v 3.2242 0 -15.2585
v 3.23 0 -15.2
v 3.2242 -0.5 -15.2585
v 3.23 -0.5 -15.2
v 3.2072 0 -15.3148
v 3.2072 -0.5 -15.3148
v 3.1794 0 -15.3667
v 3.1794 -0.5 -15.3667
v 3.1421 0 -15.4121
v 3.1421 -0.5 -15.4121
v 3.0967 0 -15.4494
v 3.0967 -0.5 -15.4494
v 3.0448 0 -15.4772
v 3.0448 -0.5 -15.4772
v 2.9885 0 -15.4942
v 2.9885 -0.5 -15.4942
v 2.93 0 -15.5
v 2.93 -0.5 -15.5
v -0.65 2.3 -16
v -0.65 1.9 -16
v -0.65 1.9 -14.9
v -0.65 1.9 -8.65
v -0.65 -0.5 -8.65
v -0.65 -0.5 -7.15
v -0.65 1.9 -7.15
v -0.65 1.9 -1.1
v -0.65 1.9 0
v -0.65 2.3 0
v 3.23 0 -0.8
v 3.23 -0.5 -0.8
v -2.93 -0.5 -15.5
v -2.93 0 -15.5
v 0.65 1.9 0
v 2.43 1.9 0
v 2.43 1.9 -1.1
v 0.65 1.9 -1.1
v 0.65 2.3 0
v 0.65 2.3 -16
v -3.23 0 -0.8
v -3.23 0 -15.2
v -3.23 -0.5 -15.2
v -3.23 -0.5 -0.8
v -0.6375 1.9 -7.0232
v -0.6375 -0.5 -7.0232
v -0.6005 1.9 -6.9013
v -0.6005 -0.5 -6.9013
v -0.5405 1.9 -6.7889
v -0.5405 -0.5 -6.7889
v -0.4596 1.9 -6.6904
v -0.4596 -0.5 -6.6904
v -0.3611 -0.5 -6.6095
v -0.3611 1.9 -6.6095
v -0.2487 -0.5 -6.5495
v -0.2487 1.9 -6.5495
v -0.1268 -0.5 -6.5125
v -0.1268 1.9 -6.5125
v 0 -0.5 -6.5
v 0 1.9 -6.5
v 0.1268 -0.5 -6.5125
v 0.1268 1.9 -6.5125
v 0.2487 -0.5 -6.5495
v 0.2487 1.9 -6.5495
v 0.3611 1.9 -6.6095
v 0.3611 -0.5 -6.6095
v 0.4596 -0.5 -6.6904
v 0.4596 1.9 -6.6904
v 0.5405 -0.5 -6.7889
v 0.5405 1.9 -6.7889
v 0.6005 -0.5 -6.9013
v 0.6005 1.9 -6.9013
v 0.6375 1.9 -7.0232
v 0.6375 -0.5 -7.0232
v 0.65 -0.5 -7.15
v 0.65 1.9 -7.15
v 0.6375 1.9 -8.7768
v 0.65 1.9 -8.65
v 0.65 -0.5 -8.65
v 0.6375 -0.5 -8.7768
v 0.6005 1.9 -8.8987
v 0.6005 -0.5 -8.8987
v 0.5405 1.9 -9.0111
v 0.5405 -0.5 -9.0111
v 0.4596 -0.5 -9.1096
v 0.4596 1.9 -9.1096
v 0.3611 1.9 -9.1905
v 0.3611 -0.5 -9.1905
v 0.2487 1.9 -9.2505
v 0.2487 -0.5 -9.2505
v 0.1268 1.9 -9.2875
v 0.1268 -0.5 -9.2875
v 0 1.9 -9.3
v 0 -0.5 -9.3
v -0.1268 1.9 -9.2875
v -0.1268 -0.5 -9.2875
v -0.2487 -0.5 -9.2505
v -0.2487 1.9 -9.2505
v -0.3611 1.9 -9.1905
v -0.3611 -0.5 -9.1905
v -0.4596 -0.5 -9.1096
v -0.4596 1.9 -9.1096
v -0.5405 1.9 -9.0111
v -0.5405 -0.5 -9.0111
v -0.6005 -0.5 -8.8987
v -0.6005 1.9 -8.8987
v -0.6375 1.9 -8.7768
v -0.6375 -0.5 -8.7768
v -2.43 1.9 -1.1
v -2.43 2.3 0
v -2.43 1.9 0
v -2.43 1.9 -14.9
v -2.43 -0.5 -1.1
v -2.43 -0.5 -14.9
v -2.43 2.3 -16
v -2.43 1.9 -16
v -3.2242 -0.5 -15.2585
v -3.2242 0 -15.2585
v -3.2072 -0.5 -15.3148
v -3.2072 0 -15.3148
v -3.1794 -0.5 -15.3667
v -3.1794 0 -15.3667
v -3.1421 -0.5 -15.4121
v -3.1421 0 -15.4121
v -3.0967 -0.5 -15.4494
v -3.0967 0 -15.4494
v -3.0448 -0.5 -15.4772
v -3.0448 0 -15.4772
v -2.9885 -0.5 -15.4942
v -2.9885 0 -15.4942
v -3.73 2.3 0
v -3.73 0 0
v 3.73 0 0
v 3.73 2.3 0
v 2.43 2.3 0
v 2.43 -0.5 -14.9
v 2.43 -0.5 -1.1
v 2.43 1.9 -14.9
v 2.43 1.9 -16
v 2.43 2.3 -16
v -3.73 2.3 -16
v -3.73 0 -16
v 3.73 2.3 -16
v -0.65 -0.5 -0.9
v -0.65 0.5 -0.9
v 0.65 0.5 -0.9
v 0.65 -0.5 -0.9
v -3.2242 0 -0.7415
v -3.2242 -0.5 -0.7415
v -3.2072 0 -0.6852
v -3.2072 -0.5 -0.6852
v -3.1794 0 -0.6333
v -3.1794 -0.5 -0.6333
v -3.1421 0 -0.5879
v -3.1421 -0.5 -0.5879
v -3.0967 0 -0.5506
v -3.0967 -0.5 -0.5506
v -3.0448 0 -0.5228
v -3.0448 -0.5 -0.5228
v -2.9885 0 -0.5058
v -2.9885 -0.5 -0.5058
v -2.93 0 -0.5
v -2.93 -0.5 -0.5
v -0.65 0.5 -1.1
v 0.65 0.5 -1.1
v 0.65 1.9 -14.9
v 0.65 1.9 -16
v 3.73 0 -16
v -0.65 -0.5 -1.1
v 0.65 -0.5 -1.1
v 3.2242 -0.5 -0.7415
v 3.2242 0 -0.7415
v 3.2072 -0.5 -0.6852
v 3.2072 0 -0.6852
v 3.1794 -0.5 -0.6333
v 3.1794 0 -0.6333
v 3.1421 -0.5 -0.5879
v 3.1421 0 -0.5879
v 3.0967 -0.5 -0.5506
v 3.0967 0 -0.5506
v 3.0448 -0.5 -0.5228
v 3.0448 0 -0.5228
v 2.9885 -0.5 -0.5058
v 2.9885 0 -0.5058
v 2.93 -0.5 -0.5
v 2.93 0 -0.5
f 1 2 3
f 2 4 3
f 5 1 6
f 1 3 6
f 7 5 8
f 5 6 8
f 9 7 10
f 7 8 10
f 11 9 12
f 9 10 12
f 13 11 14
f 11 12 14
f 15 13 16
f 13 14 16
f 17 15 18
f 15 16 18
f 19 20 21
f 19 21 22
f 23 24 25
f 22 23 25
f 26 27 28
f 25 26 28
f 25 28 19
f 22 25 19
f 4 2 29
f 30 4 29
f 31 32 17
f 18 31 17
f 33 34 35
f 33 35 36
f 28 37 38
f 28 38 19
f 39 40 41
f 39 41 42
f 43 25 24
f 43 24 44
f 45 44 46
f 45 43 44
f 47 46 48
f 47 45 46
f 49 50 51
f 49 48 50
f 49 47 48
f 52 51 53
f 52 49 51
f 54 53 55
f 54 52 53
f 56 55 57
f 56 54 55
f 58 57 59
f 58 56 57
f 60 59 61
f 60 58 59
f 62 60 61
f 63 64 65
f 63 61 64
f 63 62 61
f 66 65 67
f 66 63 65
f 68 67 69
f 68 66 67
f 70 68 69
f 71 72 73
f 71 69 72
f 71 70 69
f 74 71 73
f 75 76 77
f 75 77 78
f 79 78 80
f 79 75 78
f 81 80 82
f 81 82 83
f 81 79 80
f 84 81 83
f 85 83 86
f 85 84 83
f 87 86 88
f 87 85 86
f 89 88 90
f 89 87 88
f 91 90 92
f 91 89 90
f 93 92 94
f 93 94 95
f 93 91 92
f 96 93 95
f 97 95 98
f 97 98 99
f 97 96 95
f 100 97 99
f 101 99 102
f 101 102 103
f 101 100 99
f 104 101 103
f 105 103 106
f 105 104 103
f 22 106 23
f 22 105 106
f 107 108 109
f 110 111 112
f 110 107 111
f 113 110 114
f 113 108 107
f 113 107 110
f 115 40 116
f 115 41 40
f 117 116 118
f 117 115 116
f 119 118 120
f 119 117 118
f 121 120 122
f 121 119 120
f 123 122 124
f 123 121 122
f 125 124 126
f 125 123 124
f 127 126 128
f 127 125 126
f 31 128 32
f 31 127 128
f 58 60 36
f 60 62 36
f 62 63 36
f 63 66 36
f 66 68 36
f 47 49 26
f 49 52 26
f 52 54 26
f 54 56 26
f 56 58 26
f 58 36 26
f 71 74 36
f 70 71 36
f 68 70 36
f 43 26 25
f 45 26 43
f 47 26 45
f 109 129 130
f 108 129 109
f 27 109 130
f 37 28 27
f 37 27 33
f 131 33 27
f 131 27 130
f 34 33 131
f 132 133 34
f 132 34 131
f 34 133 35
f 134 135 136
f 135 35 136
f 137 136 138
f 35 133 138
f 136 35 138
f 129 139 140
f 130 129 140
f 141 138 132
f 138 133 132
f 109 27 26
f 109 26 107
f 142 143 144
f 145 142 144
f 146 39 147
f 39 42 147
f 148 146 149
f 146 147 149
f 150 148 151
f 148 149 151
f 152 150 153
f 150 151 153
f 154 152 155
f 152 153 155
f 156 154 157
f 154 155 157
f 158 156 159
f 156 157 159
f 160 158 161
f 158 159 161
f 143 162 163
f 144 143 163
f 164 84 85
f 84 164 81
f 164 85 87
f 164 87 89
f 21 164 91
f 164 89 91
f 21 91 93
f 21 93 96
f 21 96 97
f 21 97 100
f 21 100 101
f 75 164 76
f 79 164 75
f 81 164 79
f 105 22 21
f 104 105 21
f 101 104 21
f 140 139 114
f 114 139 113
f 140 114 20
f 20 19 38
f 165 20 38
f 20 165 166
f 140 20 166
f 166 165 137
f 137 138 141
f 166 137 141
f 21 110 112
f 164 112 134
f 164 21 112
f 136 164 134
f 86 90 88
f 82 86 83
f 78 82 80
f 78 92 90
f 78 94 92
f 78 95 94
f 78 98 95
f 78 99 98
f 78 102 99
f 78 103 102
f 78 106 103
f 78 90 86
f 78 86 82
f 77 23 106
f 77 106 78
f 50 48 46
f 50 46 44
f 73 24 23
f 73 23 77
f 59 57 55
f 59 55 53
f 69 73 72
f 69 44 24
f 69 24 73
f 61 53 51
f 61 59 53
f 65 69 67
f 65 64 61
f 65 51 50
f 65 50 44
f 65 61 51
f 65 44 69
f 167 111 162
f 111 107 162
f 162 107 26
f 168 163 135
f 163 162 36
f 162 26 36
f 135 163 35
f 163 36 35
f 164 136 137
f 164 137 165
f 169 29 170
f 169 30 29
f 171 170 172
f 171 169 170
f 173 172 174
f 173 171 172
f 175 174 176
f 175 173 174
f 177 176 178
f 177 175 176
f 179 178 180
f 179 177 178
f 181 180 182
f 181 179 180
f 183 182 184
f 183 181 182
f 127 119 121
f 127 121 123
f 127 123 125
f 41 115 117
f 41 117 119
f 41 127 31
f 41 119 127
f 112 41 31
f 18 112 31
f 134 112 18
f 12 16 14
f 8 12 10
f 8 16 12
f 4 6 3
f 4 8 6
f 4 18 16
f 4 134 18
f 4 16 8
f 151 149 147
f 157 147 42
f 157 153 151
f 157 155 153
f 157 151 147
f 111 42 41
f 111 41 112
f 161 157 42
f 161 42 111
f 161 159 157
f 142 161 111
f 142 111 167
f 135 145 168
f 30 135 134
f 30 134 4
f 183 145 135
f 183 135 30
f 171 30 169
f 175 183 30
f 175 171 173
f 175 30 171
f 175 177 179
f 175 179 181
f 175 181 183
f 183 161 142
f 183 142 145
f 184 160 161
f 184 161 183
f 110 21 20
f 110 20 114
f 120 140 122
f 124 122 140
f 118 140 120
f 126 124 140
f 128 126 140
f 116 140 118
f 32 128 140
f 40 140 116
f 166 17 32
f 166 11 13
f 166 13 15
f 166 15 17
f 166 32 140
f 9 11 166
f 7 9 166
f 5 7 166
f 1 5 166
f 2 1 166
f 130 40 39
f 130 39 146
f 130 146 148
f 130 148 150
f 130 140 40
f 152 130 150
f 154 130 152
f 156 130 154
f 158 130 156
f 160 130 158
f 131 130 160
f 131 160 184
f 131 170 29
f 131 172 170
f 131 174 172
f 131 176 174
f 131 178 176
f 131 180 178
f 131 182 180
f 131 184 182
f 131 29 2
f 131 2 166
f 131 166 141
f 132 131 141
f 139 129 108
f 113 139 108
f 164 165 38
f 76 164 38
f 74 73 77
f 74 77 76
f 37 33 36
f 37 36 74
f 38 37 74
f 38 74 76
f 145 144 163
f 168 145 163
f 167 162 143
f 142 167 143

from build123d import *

# Parameters (mm, degrees)
BOSS_EXTRUDE1_DEPTH = 16
SKETCH2_W           = 1.78
SKETCH2_H           = 13.8
CUT_EXTRUDE3_DEPTH  = 17.538527746
SKETCH3_W           = 1.3
SKETCH3_H           = 13.8
CUT_EXTRUDE4_DEPTH  = 2.8
BOSS_EXTRUDE2_DEPTH = 3.4
SKETCH5_W           = 6.46
SKETCH5_H           = 15
BOSS_EXTRUDE3_DEPTH = 0.5
SKETCH7_W           = 1.78
SKETCH7_H           = 13.8
CUT_EXTRUDE5_DEPTH  = 17.718938363
SKETCH8_W           = 1.3
SKETCH8_H           = 13.8
CUT_EXTRUDE6_DEPTH  = 0.1
CUT_EXTRUDE7_START  = -1
CUT_EXTRUDE7_DEPTH  = 1
FILLET1_R           = 0.3
SKETCH10_W          = 7.46
SKETCH10_H          = 0.8
CUT_EXTRUDE9_DEPTH  = 17.718938363
SKETCH11_W          = 1.3
SKETCH11_H          = 0.4
BOSS_EXTRUDE4_DEPTH = 13.8


with BuildPart() as part:
    # Sketch1 → Boss-Extrude1 (new body)
    with BuildSketch(Plane.XY):
        Polygon((-3.73, 0), (3.73, 0), (3.73, 3.1), (2.43, 3.1), (2.43, 1.9), (0.65, 1.9), (0.65, 3.1), (-0.65, 3.1), (-0.65, 1.9), (-2.43, 1.9), (-2.43, 3.1), (-3.73, 3.1), align=None)
    extrude(amount=-BOSS_EXTRUDE1_DEPTH)

    # Sketch2 → Cut-Extrude3 (cut, through all)
    with BuildSketch(Plane(origin=(0, 1.9, 0), x_dir=(1, 0, 0), z_dir=(0, 1, 0))):
        with Locations((1.54, 8)):
            Rectangle(SKETCH2_W, SKETCH2_H)
    cut_extrude3 = extrude(amount=-CUT_EXTRUDE3_DEPTH, mode=Mode.SUBTRACT)

    # Mirror1: Cut-Extrude3 across plane
    add(cut_extrude3.mirror(Plane(origin=(0, 0, 0), x_dir=(0, 0, 1), z_dir=(1, 0, 0))), mode=Mode.SUBTRACT)

    # Sketch3 → Cut-Extrude4 (cut)
    with BuildSketch(Plane.XZ):
        with Locations((0, -8)):
            Rectangle(SKETCH3_W, SKETCH3_H)
    extrude(amount=-CUT_EXTRUDE4_DEPTH, mode=Mode.SUBTRACT)

    # Sketch4 → Boss-Extrude2 (add)
    with BuildSketch(Plane.XZ.offset(-2.8)):
        with BuildLine():
            Line((0.65, -7.15), (0.65, -8.65))
            ThreePointArc((0.65, -8.65), (0, -9.3), (-0.65, -8.65))
            Line((-0.65, -8.65), (-0.65, -7.15))
            ThreePointArc((-0.65, -7.15), (0, -6.5), (0.65, -7.15))
        make_face()
    extrude(amount=BOSS_EXTRUDE2_DEPTH)

    # Sketch5 → Boss-Extrude3 (add)
    with BuildSketch(Plane.XZ):
        with Locations((0, -8)):
            Rectangle(SKETCH5_W, SKETCH5_H)
    extrude(amount=BOSS_EXTRUDE3_DEPTH)

    # Sketch7 → Cut-Extrude5 (cut, through all)
    with BuildSketch(Plane(origin=(0, 0, 0), x_dir=(1, 0, 0), z_dir=(0, 1, 0))):
        with Locations((-1.54, 8)):
            Rectangle(SKETCH7_W, SKETCH7_H)
    cut_extrude5 = extrude(amount=-CUT_EXTRUDE5_DEPTH, mode=Mode.SUBTRACT)

    # Mirror2: Cut-Extrude5 across plane
    add(cut_extrude5.mirror(Plane(origin=(0, 0, 0), x_dir=(0, 0, 1), z_dir=(1, 0, 0))), mode=Mode.SUBTRACT)

    # Sketch8 → Cut-Extrude6 (cut)
    with BuildSketch(Plane.XZ.offset(0.5)):
        with Locations((0, -8)):
            Rectangle(SKETCH8_W, SKETCH8_H)
    extrude(amount=CUT_EXTRUDE6_DEPTH, mode=Mode.SUBTRACT)

    # Sketch9 → Cut-Extrude7 (cut)
    with BuildSketch(Plane.XZ.offset(0.5).offset(CUT_EXTRUDE7_START)):
        with BuildLine():
            Line((-0.65, -14.9), (0.65, -14.9))
            Line((0.65, -14.9), (0.65, -8.65))
            ThreePointArc((0.65, -8.65), (0, -9.3), (-0.65, -8.65))
            Line((-0.65, -8.65), (-0.65, -14.9))
        make_face()
    cut_extrude7 = extrude(amount=CUT_EXTRUDE7_DEPTH, mode=Mode.SUBTRACT)

    # Mirror3: Cut-Extrude7 across plane
    add(cut_extrude7.mirror(Plane.XY.offset(-7.9)), mode=Mode.SUBTRACT)

    # Fillet1
    fillet1_edges = [part.edges().sort_by_distance(p)[0] for p in [
        (3.23, -0.25, -0.5),
        (-3.23, -0.25, -0.5),
        (-3.23, -0.25, -15.5),
        (3.23, -0.25, -15.5),
    ]]
    fillet(fillet1_edges, radius=FILLET1_R)

    # Sketch10 → Cut-Extrude9 (cut, through all)
    with BuildSketch(Plane.XY):
        with Locations((0, 2.7)):
            Rectangle(SKETCH10_W, SKETCH10_H)
    extrude(amount=-CUT_EXTRUDE9_DEPTH, mode=Mode.SUBTRACT)


with BuildPart() as cut_extrude9_piece_1:
    # of the separate pieces the step leaves, piece 1, a body of its own (cut_extrude9_pieces)
    add(part.part.solids().sort_by_distance((-2.93, 0, -0.5))[0])



with BuildPart() as cut_extrude9_piece_2:
    # of the separate pieces the step leaves, piece 2, a body of its own (cut_extrude9_pieces)
    add(part.part.solids().sort_by_distance((-0.65, -0.5, -7.15))[0])


with BuildPart() as cut_extrude9_piece_1_1:
    add(cut_extrude9_piece_1.part)

    add(cut_extrude9_piece_2.part)  # Boss-Extrude4 merges Cut-Extrude9 piece 2
    # Sketch11 → Boss-Extrude4 (add)
    with BuildSketch(Plane(origin=(0, 0, -1.1), x_dir=(-1, 0, 0), z_dir=(0, 0, -1))):
        with Locations((0, 2.1)):
            Rectangle(SKETCH11_W, SKETCH11_H)
    extrude(amount=BOSS_EXTRUDE4_DEPTH)


solid = cut_extrude9_piece_1_1.part
